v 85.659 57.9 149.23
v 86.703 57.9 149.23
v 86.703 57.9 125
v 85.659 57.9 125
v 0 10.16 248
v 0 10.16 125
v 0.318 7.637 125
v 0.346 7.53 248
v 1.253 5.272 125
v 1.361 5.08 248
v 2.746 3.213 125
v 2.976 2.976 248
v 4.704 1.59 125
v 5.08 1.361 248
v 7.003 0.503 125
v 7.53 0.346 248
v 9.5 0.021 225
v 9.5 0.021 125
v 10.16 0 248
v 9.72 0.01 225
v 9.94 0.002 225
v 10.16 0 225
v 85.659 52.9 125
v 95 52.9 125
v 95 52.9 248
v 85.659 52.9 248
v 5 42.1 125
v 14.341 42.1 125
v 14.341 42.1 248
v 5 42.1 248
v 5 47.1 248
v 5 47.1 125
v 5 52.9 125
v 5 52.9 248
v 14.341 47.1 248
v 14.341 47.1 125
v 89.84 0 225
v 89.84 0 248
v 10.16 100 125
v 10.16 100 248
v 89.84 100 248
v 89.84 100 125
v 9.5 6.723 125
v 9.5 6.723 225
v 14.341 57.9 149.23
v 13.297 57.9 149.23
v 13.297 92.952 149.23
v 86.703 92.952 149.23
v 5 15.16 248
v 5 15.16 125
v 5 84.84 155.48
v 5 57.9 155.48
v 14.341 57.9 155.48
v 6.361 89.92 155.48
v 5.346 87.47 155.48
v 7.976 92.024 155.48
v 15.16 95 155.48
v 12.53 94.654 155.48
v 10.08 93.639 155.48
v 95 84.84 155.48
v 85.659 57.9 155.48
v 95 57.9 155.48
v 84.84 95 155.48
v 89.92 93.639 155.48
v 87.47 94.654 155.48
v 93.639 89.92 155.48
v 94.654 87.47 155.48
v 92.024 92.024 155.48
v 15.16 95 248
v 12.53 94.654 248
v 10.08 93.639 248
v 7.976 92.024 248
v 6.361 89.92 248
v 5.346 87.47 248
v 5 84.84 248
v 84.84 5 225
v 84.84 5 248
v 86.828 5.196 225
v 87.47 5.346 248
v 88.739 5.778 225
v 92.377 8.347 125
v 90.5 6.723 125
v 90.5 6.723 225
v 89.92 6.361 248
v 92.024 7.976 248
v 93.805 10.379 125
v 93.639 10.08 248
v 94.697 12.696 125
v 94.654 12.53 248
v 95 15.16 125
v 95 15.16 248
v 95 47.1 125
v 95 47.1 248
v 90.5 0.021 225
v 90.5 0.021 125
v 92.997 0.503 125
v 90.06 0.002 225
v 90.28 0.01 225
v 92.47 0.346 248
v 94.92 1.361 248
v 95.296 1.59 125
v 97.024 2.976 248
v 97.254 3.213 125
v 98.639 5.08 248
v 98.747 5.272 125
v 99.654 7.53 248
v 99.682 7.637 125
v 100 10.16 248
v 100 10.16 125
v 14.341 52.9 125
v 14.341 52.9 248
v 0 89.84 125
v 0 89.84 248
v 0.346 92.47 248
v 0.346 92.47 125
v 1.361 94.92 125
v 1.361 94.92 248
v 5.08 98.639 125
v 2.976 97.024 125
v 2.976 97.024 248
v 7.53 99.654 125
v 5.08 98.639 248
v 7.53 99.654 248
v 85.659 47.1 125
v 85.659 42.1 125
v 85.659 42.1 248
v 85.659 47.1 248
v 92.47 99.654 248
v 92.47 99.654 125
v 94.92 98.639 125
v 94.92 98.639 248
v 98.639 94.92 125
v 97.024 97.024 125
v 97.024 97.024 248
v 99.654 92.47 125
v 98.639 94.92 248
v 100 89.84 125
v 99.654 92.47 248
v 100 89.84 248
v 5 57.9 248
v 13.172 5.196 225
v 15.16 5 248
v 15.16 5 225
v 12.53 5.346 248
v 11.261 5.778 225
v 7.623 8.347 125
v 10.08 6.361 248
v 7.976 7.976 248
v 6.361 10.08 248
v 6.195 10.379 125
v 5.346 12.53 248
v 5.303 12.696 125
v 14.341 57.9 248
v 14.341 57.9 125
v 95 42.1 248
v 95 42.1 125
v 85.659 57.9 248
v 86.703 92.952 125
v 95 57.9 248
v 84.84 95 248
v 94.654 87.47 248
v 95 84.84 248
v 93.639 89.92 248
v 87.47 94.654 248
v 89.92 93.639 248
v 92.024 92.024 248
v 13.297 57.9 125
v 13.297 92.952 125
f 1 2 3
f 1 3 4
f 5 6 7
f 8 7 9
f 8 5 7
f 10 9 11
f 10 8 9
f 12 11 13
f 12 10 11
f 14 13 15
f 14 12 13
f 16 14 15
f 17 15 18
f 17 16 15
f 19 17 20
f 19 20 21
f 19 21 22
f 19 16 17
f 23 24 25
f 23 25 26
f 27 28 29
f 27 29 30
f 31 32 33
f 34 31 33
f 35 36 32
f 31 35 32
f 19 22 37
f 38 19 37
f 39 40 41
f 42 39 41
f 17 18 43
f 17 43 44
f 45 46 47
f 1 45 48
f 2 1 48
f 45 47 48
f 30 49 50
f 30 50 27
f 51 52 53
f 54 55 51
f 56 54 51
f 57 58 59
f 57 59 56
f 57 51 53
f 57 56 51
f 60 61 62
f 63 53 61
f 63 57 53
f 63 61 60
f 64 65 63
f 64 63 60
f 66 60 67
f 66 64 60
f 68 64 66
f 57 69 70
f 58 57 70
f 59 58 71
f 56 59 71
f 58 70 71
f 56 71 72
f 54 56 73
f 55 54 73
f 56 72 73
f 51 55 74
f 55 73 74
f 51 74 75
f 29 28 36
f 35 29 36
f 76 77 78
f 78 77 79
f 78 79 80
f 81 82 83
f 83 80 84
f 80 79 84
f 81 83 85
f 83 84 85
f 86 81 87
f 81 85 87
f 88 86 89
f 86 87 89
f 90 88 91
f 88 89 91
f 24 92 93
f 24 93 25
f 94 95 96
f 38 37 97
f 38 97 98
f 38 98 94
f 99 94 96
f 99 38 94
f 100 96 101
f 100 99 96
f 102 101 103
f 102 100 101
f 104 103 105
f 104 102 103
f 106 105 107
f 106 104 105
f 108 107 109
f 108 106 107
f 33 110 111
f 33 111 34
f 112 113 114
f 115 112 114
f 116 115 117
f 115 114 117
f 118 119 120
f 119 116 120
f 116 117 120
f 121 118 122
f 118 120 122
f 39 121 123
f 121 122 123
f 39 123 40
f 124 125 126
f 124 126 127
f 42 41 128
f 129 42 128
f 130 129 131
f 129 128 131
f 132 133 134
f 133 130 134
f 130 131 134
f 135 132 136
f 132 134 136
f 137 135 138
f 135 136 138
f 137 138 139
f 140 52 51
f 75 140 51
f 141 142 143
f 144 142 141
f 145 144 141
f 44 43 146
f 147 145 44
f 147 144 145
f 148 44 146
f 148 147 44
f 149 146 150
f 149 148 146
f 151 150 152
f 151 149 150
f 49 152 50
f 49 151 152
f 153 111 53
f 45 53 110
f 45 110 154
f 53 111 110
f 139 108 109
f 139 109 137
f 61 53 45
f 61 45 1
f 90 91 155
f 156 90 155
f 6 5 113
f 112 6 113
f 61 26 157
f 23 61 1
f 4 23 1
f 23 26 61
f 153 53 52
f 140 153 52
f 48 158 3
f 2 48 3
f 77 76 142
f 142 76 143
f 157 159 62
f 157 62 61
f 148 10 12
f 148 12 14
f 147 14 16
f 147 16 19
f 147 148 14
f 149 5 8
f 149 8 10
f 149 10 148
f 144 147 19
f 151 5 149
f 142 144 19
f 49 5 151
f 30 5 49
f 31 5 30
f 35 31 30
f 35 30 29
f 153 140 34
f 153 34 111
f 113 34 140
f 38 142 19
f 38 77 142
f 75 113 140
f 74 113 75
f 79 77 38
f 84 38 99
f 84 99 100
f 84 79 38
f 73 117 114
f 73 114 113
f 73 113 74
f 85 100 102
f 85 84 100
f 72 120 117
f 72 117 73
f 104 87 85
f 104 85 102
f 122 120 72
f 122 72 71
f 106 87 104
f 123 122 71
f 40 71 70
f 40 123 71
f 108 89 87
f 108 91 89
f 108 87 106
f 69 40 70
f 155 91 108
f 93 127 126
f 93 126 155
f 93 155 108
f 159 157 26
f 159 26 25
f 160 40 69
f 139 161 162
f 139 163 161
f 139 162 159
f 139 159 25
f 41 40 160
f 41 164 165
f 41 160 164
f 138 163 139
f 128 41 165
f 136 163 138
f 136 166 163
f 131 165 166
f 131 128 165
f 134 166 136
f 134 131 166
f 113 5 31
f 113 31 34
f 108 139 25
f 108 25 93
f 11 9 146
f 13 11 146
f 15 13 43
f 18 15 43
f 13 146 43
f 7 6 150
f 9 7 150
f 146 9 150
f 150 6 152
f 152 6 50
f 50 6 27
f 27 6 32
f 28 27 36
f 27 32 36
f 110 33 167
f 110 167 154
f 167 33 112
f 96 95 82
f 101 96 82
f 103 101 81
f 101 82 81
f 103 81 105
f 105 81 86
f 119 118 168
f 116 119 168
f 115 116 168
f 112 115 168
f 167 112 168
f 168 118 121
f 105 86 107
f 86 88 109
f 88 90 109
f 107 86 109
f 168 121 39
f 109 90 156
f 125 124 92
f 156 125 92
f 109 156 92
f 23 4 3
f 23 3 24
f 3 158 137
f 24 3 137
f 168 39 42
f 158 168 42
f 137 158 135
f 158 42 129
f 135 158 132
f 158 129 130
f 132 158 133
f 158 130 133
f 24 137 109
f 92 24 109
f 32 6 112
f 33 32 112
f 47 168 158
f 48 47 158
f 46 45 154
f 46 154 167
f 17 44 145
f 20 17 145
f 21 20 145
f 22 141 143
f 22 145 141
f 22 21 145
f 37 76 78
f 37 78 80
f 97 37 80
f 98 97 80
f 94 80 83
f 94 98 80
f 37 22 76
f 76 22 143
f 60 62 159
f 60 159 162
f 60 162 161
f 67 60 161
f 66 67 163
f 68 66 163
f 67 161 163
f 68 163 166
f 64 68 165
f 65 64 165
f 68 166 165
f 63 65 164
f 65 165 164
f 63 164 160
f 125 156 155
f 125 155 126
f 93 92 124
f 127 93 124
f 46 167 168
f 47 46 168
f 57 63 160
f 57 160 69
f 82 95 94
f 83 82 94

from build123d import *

# Parameters (mm, degrees)
SKETCH1_W           = 100
SKETCH1_H           = 100
BOSS_EXTRUDE1_DEPTH = 250
SKETCH2_W           = 90
SKETCH2_H           = 90
CUT_EXTRUDE1_DEPTH  = 288.228132327
FILLET1_R           = 10.16
SKETCH3_W           = 9.3412
SKETCH3_H           = 5
BOSS_EXTRUDE2_DEPTH = 250
SKETCH4_W           = 100
SKETCH4_H           = 125
CUT_EXTRUDE2_DEPTH  = 288.228132327
SKETCH6_W           = 81
SKETCH6_H           = 100
CUT_EXTRUDE4_DEPTH  = 5
FILLET3_R           = 10.16
BOSS_EXTRUDE3_DEPTH = 30.48
SKETCH9_W           = 73.406
SKETCH9_H           = 6.25
BOSS_EXTRUDE5_DEPTH = 35.052
CUT_EXTRUDE5_DEPTH  = 2


with BuildPart() as part:
    # Sketch1 → Boss-Extrude1 (new body)
    with BuildSketch(Plane.XY):
        with Locations((50, 50)):
            Rectangle(SKETCH1_W, SKETCH1_H)
    extrude(amount=BOSS_EXTRUDE1_DEPTH)

    # Sketch2 → Cut-Extrude1 (cut, through all)
    with BuildSketch(Plane(origin=(0, 0, 0), x_dir=(-1, 0, 0), z_dir=(0, 0, -1))):
        with Locations((-50, 50)):
            Rectangle(SKETCH2_W, SKETCH2_H)
    extrude(amount=-CUT_EXTRUDE1_DEPTH, mode=Mode.SUBTRACT)

    # Fillet1
    fillet1_edges = [part.edges().sort_by_distance(p)[0] for p in [
        (0, 100, 125),
        (0, 0, 125),
        (100, 0, 125),
        (100, 100, 125),
    ]]
    fillet(fillet1_edges, radius=FILLET1_R)

    # Sketch3 → Boss-Extrude2 (add, through all)
    with BuildSketch(Plane(origin=(0, 0, 0), x_dir=(-1, 0, 0), z_dir=(0, 0, -1))):
        with Locations((-90.3294, 55.4)):
            Rectangle(SKETCH3_W, SKETCH3_H)
        with Locations((-90.3294, 44.6)):
            Rectangle(SKETCH3_W, SKETCH3_H)
        with Locations((-9.6706, 44.6)):
            Rectangle(SKETCH3_W, SKETCH3_H)
        with Locations((-9.6706, 55.4)):
            Rectangle(SKETCH3_W, SKETCH3_H)
    extrude(amount=-BOSS_EXTRUDE2_DEPTH)

    # Sketch4 → Cut-Extrude2 (cut, through all)
    with BuildSketch(Plane(origin=(0, 100, 0), x_dir=(1, 0, 0), z_dir=(0, 1, 0))):
        with Locations((50, -62.5)):
            Rectangle(SKETCH4_W, SKETCH4_H)
    extrude(amount=-CUT_EXTRUDE2_DEPTH, mode=Mode.SUBTRACT)

    # Sketch6 → Cut-Extrude4 (cut)
    with BuildSketch(Plane.XZ):
        with Locations((50, 175)):
            Rectangle(SKETCH6_W, SKETCH6_H)
    extrude(amount=-CUT_EXTRUDE4_DEPTH, mode=Mode.SUBTRACT)

    # Fillet3
    fillet3_edges = [part.edges().sort_by_distance(p)[0] for p in [
        (5, 95, 187.5),
        (5, 5, 187.5),
        (95, 95, 187.5),
        (95, 5, 187.5),
    ]]
    fillet(fillet3_edges, radius=FILLET3_R)

    # Sketch7 → Boss-Extrude3 (add)
    with BuildSketch(Plane(origin=(0, 0, 125), x_dir=(-1, 0, 0), z_dir=(0, 0, -1))):
        Polygon((-95, 96), (-5, 96), (-5, 57.9), (-13.297, 57.9), (-13.297, 92.952), (-86.703, 92.952), (-86.703, 57.9), (-95, 57.9), align=None)
    extrude(amount=-BOSS_EXTRUDE3_DEPTH)

    # Sketch9 → Boss-Extrude5 (add)
    with BuildSketch(Plane.XZ.offset(-92.952)):
        with Locations((50, 152.355)):
            Rectangle(SKETCH9_W, SKETCH9_H)
    extrude(amount=BOSS_EXTRUDE5_DEPTH)

    # Sketch10 → Cut-Extrude5 (cut)
    with BuildSketch(Plane.XY.offset(250)):
        with BuildLine():
            Line((89.84, 100), (10.16, 100))
            ThreePointArc((10.16, 100), (2.975795103, 97.024204897), (0, 89.84))
            Line((0, 89.84), (0, 10.16))
            ThreePointArc((0, 10.16), (2.975795103, 2.975795103), (10.16, 0))
            Line((10.16, 0), (89.84, 0))
            ThreePointArc((89.84, 0), (97.024204897, 2.975795103), (100, 10.16))
            Line((100, 10.16), (100, 89.84))
            ThreePointArc((100, 89.84), (97.024204897, 97.024204897), (89.84, 100))
        make_face()
    extrude(amount=-CUT_EXTRUDE5_DEPTH, mode=Mode.SUBTRACT)


solid = part.part
